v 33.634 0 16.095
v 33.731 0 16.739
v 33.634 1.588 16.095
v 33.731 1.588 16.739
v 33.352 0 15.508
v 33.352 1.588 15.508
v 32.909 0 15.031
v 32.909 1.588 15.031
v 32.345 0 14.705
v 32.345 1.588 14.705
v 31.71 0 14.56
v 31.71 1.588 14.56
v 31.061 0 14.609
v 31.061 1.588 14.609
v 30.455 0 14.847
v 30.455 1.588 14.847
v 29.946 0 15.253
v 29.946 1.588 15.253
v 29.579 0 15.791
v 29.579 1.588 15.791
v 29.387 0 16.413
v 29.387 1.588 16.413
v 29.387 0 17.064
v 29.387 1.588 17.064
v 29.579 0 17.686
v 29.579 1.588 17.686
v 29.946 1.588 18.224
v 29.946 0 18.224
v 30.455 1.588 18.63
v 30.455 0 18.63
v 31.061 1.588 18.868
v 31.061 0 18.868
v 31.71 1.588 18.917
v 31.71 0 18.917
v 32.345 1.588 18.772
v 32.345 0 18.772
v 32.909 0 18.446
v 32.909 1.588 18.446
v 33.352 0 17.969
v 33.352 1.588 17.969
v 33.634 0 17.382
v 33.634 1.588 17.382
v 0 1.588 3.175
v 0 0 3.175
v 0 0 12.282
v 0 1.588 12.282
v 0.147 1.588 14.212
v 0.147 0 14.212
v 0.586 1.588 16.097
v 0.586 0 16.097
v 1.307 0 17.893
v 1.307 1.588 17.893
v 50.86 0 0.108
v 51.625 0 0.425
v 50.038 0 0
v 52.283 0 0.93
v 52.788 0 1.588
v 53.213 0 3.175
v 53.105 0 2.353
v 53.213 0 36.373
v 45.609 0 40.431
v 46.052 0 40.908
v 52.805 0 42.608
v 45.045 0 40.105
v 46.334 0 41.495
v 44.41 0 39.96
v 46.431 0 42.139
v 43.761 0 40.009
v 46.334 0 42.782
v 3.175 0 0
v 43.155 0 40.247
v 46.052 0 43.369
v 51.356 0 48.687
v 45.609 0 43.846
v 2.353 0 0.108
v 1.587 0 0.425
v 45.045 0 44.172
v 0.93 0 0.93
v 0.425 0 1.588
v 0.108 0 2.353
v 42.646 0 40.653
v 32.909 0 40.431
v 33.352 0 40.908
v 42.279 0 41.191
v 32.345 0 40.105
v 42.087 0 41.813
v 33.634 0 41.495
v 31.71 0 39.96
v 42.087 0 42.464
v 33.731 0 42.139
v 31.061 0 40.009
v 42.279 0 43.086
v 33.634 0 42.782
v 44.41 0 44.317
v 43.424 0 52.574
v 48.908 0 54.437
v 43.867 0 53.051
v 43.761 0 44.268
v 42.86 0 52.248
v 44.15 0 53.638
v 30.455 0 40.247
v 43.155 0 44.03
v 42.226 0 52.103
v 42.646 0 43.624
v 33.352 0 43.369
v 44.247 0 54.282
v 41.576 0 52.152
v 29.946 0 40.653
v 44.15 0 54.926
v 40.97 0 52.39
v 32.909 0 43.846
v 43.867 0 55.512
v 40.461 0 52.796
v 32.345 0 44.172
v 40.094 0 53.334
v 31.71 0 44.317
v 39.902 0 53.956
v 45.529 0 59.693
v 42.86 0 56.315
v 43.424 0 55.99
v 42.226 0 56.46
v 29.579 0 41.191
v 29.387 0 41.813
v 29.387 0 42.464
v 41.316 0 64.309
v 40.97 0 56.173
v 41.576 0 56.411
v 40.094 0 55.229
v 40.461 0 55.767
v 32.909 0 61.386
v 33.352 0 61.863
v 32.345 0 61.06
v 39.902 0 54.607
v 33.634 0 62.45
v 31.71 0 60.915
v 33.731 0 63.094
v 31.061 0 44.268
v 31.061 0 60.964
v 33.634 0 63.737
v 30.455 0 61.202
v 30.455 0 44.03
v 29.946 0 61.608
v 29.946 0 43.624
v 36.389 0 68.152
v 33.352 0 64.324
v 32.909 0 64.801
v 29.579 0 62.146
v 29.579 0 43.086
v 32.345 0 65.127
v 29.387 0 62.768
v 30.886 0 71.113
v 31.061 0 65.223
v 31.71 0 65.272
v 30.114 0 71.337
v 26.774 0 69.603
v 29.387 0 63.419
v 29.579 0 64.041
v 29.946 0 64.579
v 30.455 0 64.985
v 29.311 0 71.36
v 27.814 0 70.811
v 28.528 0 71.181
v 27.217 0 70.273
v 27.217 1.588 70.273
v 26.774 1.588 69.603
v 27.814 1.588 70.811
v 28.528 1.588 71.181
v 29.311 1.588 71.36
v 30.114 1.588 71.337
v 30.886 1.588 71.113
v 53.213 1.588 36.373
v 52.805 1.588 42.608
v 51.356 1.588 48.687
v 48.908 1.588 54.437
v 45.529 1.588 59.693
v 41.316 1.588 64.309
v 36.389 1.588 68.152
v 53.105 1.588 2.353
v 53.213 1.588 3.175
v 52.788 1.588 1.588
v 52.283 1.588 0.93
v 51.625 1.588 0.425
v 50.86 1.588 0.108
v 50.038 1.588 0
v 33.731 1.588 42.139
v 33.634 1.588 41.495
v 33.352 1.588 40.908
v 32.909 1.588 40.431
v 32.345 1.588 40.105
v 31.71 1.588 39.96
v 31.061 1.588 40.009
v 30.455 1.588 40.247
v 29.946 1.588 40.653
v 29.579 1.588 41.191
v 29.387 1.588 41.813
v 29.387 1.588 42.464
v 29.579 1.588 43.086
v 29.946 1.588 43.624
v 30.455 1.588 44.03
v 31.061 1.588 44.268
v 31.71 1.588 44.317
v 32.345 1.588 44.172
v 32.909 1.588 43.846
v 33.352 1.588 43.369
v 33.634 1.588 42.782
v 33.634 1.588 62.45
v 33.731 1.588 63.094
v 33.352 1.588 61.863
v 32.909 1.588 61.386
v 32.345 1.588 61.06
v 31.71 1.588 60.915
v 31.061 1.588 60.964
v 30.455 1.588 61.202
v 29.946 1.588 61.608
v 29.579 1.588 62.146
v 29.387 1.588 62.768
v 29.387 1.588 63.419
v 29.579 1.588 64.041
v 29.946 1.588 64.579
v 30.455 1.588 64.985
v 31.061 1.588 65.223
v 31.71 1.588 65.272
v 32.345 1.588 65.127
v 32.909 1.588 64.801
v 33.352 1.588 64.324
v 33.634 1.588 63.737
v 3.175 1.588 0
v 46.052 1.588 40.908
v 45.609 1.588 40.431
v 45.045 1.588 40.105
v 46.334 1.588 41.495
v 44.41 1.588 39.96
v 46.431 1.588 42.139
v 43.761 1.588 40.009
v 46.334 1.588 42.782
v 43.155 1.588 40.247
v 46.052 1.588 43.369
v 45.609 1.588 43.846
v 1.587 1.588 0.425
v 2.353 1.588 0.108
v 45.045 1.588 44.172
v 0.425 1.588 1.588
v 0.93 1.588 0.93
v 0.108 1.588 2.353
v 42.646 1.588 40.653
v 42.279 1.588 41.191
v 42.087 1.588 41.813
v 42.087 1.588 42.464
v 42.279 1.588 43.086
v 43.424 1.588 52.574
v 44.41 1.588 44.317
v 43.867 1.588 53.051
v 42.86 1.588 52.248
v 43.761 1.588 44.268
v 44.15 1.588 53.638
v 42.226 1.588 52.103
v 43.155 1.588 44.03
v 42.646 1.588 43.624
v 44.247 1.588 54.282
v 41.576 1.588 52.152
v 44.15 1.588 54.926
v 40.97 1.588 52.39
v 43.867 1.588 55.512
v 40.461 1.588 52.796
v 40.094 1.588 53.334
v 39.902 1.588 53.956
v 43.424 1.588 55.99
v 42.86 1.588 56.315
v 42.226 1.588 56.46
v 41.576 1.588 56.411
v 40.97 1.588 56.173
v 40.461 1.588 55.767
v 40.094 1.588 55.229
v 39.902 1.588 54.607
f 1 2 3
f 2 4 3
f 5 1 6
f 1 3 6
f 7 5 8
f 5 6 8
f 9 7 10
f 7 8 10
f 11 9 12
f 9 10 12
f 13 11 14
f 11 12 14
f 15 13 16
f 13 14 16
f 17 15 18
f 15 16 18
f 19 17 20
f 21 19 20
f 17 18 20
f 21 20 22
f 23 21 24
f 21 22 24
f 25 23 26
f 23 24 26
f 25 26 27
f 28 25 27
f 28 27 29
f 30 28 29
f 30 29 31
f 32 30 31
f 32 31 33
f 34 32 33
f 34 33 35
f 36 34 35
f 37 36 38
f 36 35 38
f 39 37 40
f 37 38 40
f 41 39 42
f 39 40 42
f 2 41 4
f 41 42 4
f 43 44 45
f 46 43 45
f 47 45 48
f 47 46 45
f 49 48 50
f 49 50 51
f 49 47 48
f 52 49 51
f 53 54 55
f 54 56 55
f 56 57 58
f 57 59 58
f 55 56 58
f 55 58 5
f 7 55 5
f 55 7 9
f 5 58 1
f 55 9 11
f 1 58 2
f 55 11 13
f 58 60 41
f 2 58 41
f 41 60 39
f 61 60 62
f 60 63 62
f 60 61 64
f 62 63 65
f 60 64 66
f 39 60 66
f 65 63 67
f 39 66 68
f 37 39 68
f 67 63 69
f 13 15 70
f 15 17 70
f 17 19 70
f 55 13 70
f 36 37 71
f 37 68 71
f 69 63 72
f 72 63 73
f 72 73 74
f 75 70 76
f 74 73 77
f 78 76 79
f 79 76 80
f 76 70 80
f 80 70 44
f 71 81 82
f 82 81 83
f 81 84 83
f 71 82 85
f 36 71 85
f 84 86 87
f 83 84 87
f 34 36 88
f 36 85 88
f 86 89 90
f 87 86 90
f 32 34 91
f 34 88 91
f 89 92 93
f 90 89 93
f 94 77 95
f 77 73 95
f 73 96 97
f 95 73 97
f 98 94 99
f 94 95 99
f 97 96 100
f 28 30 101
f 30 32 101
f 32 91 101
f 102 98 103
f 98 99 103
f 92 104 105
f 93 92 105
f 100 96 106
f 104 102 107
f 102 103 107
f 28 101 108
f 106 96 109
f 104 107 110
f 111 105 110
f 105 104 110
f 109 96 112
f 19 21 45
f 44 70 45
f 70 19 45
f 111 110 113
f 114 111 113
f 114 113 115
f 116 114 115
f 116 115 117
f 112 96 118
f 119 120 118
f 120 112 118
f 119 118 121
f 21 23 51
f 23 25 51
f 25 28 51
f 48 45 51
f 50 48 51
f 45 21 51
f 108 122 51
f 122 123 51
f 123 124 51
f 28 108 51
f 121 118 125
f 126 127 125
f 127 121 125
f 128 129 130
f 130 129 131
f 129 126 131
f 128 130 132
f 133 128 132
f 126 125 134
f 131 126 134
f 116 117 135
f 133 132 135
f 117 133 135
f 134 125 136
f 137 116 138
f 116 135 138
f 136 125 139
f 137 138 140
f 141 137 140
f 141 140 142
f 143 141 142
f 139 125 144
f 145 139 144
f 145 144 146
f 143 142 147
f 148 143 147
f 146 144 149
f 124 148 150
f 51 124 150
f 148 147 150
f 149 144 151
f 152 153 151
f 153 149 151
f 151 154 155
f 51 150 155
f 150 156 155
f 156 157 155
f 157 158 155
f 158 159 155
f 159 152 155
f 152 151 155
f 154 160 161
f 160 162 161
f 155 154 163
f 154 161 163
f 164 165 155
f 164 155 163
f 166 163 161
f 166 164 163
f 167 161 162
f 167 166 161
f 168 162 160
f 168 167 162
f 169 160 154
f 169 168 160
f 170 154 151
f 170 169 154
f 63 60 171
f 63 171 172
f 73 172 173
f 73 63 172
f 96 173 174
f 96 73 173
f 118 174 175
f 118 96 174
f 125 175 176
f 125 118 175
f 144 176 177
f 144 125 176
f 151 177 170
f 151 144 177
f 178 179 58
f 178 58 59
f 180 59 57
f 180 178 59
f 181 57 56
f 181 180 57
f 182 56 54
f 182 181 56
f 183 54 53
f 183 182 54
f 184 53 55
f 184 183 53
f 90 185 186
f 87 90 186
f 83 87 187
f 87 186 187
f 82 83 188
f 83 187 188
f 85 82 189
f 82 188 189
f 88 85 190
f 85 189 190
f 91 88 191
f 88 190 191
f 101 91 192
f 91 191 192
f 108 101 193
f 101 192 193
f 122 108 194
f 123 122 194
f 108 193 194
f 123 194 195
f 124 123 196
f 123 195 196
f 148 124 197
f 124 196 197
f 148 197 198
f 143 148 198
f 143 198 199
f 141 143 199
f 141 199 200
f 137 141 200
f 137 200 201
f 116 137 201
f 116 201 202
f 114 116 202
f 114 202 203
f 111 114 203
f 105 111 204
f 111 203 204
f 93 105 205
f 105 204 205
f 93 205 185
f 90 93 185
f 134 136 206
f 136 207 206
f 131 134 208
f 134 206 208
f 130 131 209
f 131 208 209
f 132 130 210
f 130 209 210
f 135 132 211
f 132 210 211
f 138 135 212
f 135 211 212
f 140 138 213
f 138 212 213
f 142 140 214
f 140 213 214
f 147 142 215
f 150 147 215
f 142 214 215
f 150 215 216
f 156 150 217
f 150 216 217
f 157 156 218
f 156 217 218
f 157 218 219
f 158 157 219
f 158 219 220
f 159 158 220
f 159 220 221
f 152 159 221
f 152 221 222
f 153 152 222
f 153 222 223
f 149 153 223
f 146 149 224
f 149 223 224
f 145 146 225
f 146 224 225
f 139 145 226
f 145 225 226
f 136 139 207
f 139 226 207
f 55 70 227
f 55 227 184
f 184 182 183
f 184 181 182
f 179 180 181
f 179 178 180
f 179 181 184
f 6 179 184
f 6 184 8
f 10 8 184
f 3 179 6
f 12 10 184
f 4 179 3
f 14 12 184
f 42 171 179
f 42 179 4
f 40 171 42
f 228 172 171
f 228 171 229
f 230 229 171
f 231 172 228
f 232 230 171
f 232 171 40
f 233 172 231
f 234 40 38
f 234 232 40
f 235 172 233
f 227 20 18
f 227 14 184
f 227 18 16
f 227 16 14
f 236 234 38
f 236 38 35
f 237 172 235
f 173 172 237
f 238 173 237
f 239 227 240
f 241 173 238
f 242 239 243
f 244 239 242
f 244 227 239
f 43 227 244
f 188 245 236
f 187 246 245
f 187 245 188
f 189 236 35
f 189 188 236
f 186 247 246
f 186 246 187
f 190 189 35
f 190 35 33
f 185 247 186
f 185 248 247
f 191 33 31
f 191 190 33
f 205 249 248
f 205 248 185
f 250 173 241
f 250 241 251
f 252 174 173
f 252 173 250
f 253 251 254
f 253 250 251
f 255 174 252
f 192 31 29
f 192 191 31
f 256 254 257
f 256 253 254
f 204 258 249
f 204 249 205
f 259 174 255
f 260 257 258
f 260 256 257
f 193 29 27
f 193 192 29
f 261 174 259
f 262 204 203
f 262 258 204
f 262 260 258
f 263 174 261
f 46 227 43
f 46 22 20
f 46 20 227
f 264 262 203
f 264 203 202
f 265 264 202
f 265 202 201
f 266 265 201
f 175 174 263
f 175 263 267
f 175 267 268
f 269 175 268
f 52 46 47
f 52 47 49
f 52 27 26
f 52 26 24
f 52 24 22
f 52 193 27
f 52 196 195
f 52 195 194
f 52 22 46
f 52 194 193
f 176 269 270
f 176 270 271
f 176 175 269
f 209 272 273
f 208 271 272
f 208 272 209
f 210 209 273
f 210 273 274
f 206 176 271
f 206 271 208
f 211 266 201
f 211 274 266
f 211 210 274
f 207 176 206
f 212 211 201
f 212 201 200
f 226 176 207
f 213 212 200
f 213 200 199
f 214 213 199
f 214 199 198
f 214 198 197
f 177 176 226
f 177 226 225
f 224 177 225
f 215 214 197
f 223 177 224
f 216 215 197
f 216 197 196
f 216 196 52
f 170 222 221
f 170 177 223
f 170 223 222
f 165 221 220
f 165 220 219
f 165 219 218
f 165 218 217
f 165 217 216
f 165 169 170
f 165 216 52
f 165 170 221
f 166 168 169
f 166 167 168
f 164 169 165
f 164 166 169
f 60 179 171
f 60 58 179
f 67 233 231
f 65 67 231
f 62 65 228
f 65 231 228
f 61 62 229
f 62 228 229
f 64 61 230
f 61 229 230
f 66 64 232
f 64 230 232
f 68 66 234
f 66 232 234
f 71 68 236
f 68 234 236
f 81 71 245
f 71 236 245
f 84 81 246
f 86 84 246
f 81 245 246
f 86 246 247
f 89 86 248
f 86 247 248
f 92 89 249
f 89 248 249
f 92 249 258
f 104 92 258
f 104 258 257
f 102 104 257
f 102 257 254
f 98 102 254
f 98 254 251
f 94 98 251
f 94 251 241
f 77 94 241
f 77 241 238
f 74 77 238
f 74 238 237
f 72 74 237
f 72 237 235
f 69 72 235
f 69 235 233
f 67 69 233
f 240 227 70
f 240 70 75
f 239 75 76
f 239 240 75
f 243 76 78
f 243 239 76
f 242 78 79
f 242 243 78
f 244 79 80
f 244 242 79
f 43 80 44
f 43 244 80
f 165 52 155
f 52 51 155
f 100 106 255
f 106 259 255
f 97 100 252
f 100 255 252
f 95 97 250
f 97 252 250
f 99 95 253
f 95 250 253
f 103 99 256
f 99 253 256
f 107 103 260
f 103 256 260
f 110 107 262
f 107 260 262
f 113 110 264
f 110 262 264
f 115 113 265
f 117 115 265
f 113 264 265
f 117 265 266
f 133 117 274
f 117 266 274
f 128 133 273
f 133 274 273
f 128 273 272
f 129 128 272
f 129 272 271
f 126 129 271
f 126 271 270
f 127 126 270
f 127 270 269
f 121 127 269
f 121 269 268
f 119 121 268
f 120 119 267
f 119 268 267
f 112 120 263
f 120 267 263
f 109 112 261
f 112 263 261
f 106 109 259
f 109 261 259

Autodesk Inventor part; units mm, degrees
ref_plane "YZ Plane" through (0, 0, 0) normal (1, 0, 0) x (0, 1, 0)
ref_plane "XZ Plane" through (0, 0, 0) normal (0, 1, 0) x (-1, 0, 0)
ref_plane "XY Plane" through (0, 0, 0) normal (0, 0, 1) x (1, 0, 0)
sketch "Sketch9" plane through (0, 0, 0) normal (0, 1, 0) x (-1, 0, 0)
  line L0 (0, 0) -> (-53.213, 0)
  line L1 (-53.213, 0) -> (-53.213, 36.3728)
  line L2 (0, 0) -> (0, 15.24)
  line L3 (0, 15.24) -> (-28.0555, 72.2061)
  arc A0 (-28.0555, 72.2061) -> (-53.213, 36.3728) centre (-16.1162, 37.0761) ccw
  dimension "d113" = 53.213
  dimension "d114" = 36.3728
  dimension "d115" = 15.24
  dimension "d116" = 63.5
  dimension "d117" = 153.78
extrude "Extrusion10" add sketch "Sketch9" along normal blind 1.5875
sketch "Sketch10" plane through (0, 1.5875, 0) normal (0, 1, 0) x (1, 0, 0)
  line L0 (53.213, -36.3728) -> (53.213, 0) projected
  line L1 (53.213, 0) -> (44.2468, 0)
  line L2 (53.213, 0) -> (0, 0) projected
  line L3 (44.2468, 0) -> (44.2468, -16.7386)
  line L4 (44.2468, 0) -> (44.2468, -42.1386)
  circle A0 centre (44.2468, -42.1386) radius 2.1844
  line L5 (44.2468, -42.1386) -> (31.5468, -42.1386)
  circle A1 centre (31.5468, -42.1386) radius 2.1844
  line L6 (53.213, 0) -> (27.813, 0)
  line L7 (31.5468, -42.1386) -> (31.5468, 0)
  line L8 (31.5468, -42.1386) -> (31.5468, -63.0936)
  circle A2 centre (31.5468, -63.0936) radius 2.1844
  circle A3 centre (42.0624, -54.2817) radius 2.1844
  arc A4 (31.5468, -63.0936) -> (44.2468, -42.1386) centre (25.3391, -45.0054) ccw
  line L9 (31.5468, 0) -> (31.5468, -16.7386)
  circle A5 centre (31.5468, -16.7386) radius 2.1844
  dimension "d123" = 8.9662
  dimension "d124" = 16.7386
  dimension "d126" = 42.1386
  dimension "d127" = 12.7
  dimension "d128" = 4.3688
  dimension "d129" = 25.4
  dimension "d130" = 20.955
  dimension "d131" = 4.3688
  dimension "d134" = 4.3688
  dimension "d142" = 16.7386
  dimension "d143" = 4.3688
fillet "Fillet4" radius 3.175 2 edges at (28.0555, 0.7937, 72.2061) (53.213, 0.7937, 0)
fillet "Fillet5" radius 3.175 1 edges at (0, 0.7937, 0)
fillet "Fillet6" radius 12.7 1 edges at (0, 0.7937, 15.24)
sketch "Sketch12" plane through (0, 1.5875, 0) normal (0, 1, 0) x (1, 0, 0)
  point P0 (0, 0)
  point P1 (3.175, 0)
extrude "Extrusion13" cut sketch "Sketch10" against normal blind 1.5875 contours A5 L7 | L7 A5 | A0 A4 L4 | L4 L5 A0 | A4 A0 L5 | L7 L8 A1 | A1 L5 L7 | A1 L8 L5 | A4 A3 | A3 A4 | A2 A4 L8 | L8 A4 A2
properties part number "New-Sleds" material "Polycarbonate, Clear"
